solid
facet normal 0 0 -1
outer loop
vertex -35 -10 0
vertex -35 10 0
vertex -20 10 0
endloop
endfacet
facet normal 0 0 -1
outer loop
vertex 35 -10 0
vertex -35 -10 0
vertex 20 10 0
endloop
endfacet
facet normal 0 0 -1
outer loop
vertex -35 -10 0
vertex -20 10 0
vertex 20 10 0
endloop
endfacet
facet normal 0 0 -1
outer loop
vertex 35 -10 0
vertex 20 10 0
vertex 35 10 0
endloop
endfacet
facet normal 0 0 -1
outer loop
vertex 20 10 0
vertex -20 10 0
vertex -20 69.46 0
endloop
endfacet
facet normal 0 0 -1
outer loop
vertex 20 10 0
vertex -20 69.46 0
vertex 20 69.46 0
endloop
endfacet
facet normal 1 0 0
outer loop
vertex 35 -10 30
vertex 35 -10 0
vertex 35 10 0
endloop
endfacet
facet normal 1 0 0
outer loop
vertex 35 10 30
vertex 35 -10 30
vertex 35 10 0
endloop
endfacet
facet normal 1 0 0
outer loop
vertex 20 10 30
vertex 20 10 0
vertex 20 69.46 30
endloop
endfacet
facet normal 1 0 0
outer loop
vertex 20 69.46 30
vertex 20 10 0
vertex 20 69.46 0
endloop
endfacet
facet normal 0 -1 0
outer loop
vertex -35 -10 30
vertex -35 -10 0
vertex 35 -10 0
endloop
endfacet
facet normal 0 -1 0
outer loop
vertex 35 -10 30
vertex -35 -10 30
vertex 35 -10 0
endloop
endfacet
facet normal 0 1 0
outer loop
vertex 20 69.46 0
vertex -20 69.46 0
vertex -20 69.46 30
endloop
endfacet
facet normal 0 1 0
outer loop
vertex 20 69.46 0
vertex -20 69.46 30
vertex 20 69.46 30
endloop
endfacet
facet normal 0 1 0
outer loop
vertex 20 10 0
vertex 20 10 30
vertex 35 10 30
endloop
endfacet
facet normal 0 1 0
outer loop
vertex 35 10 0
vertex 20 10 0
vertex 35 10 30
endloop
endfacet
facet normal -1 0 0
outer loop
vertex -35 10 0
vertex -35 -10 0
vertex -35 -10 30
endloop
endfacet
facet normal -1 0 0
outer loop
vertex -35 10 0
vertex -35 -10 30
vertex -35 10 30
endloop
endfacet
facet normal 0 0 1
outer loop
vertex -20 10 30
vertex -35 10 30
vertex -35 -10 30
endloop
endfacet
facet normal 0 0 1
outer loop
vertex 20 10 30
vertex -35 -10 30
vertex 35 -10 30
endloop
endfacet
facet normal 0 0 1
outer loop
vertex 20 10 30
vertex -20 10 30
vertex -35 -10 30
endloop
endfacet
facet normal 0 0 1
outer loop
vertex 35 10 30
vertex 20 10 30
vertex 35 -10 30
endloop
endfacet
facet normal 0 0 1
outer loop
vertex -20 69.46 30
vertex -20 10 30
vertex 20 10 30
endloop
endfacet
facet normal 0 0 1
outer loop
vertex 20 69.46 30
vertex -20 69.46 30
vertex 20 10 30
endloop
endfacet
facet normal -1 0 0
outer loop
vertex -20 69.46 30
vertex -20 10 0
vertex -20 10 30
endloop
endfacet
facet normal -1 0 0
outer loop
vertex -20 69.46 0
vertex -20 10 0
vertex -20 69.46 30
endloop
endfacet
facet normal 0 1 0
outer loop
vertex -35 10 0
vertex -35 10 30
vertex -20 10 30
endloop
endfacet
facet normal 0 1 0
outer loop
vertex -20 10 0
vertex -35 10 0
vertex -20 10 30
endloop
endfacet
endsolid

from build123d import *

# Parameters (mm, degrees)
SKETCH1_W           = 40
SKETCH1_H           = 59.46
SKETCH1_W_2         = 70
SKETCH1_H_2         = 20
BOSS_EXTRUDE1_DEPTH = 30


with BuildPart() as part:
    # Sketch1 → Boss-Extrude1 (new body)
    with BuildSketch(Plane.XY):
        with Locations((0, 39.73)):
            Rectangle(SKETCH1_W, SKETCH1_H)
        Rectangle(SKETCH1_W_2, SKETCH1_H_2)
    extrude(amount=BOSS_EXTRUDE1_DEPTH)


solid = part.part
